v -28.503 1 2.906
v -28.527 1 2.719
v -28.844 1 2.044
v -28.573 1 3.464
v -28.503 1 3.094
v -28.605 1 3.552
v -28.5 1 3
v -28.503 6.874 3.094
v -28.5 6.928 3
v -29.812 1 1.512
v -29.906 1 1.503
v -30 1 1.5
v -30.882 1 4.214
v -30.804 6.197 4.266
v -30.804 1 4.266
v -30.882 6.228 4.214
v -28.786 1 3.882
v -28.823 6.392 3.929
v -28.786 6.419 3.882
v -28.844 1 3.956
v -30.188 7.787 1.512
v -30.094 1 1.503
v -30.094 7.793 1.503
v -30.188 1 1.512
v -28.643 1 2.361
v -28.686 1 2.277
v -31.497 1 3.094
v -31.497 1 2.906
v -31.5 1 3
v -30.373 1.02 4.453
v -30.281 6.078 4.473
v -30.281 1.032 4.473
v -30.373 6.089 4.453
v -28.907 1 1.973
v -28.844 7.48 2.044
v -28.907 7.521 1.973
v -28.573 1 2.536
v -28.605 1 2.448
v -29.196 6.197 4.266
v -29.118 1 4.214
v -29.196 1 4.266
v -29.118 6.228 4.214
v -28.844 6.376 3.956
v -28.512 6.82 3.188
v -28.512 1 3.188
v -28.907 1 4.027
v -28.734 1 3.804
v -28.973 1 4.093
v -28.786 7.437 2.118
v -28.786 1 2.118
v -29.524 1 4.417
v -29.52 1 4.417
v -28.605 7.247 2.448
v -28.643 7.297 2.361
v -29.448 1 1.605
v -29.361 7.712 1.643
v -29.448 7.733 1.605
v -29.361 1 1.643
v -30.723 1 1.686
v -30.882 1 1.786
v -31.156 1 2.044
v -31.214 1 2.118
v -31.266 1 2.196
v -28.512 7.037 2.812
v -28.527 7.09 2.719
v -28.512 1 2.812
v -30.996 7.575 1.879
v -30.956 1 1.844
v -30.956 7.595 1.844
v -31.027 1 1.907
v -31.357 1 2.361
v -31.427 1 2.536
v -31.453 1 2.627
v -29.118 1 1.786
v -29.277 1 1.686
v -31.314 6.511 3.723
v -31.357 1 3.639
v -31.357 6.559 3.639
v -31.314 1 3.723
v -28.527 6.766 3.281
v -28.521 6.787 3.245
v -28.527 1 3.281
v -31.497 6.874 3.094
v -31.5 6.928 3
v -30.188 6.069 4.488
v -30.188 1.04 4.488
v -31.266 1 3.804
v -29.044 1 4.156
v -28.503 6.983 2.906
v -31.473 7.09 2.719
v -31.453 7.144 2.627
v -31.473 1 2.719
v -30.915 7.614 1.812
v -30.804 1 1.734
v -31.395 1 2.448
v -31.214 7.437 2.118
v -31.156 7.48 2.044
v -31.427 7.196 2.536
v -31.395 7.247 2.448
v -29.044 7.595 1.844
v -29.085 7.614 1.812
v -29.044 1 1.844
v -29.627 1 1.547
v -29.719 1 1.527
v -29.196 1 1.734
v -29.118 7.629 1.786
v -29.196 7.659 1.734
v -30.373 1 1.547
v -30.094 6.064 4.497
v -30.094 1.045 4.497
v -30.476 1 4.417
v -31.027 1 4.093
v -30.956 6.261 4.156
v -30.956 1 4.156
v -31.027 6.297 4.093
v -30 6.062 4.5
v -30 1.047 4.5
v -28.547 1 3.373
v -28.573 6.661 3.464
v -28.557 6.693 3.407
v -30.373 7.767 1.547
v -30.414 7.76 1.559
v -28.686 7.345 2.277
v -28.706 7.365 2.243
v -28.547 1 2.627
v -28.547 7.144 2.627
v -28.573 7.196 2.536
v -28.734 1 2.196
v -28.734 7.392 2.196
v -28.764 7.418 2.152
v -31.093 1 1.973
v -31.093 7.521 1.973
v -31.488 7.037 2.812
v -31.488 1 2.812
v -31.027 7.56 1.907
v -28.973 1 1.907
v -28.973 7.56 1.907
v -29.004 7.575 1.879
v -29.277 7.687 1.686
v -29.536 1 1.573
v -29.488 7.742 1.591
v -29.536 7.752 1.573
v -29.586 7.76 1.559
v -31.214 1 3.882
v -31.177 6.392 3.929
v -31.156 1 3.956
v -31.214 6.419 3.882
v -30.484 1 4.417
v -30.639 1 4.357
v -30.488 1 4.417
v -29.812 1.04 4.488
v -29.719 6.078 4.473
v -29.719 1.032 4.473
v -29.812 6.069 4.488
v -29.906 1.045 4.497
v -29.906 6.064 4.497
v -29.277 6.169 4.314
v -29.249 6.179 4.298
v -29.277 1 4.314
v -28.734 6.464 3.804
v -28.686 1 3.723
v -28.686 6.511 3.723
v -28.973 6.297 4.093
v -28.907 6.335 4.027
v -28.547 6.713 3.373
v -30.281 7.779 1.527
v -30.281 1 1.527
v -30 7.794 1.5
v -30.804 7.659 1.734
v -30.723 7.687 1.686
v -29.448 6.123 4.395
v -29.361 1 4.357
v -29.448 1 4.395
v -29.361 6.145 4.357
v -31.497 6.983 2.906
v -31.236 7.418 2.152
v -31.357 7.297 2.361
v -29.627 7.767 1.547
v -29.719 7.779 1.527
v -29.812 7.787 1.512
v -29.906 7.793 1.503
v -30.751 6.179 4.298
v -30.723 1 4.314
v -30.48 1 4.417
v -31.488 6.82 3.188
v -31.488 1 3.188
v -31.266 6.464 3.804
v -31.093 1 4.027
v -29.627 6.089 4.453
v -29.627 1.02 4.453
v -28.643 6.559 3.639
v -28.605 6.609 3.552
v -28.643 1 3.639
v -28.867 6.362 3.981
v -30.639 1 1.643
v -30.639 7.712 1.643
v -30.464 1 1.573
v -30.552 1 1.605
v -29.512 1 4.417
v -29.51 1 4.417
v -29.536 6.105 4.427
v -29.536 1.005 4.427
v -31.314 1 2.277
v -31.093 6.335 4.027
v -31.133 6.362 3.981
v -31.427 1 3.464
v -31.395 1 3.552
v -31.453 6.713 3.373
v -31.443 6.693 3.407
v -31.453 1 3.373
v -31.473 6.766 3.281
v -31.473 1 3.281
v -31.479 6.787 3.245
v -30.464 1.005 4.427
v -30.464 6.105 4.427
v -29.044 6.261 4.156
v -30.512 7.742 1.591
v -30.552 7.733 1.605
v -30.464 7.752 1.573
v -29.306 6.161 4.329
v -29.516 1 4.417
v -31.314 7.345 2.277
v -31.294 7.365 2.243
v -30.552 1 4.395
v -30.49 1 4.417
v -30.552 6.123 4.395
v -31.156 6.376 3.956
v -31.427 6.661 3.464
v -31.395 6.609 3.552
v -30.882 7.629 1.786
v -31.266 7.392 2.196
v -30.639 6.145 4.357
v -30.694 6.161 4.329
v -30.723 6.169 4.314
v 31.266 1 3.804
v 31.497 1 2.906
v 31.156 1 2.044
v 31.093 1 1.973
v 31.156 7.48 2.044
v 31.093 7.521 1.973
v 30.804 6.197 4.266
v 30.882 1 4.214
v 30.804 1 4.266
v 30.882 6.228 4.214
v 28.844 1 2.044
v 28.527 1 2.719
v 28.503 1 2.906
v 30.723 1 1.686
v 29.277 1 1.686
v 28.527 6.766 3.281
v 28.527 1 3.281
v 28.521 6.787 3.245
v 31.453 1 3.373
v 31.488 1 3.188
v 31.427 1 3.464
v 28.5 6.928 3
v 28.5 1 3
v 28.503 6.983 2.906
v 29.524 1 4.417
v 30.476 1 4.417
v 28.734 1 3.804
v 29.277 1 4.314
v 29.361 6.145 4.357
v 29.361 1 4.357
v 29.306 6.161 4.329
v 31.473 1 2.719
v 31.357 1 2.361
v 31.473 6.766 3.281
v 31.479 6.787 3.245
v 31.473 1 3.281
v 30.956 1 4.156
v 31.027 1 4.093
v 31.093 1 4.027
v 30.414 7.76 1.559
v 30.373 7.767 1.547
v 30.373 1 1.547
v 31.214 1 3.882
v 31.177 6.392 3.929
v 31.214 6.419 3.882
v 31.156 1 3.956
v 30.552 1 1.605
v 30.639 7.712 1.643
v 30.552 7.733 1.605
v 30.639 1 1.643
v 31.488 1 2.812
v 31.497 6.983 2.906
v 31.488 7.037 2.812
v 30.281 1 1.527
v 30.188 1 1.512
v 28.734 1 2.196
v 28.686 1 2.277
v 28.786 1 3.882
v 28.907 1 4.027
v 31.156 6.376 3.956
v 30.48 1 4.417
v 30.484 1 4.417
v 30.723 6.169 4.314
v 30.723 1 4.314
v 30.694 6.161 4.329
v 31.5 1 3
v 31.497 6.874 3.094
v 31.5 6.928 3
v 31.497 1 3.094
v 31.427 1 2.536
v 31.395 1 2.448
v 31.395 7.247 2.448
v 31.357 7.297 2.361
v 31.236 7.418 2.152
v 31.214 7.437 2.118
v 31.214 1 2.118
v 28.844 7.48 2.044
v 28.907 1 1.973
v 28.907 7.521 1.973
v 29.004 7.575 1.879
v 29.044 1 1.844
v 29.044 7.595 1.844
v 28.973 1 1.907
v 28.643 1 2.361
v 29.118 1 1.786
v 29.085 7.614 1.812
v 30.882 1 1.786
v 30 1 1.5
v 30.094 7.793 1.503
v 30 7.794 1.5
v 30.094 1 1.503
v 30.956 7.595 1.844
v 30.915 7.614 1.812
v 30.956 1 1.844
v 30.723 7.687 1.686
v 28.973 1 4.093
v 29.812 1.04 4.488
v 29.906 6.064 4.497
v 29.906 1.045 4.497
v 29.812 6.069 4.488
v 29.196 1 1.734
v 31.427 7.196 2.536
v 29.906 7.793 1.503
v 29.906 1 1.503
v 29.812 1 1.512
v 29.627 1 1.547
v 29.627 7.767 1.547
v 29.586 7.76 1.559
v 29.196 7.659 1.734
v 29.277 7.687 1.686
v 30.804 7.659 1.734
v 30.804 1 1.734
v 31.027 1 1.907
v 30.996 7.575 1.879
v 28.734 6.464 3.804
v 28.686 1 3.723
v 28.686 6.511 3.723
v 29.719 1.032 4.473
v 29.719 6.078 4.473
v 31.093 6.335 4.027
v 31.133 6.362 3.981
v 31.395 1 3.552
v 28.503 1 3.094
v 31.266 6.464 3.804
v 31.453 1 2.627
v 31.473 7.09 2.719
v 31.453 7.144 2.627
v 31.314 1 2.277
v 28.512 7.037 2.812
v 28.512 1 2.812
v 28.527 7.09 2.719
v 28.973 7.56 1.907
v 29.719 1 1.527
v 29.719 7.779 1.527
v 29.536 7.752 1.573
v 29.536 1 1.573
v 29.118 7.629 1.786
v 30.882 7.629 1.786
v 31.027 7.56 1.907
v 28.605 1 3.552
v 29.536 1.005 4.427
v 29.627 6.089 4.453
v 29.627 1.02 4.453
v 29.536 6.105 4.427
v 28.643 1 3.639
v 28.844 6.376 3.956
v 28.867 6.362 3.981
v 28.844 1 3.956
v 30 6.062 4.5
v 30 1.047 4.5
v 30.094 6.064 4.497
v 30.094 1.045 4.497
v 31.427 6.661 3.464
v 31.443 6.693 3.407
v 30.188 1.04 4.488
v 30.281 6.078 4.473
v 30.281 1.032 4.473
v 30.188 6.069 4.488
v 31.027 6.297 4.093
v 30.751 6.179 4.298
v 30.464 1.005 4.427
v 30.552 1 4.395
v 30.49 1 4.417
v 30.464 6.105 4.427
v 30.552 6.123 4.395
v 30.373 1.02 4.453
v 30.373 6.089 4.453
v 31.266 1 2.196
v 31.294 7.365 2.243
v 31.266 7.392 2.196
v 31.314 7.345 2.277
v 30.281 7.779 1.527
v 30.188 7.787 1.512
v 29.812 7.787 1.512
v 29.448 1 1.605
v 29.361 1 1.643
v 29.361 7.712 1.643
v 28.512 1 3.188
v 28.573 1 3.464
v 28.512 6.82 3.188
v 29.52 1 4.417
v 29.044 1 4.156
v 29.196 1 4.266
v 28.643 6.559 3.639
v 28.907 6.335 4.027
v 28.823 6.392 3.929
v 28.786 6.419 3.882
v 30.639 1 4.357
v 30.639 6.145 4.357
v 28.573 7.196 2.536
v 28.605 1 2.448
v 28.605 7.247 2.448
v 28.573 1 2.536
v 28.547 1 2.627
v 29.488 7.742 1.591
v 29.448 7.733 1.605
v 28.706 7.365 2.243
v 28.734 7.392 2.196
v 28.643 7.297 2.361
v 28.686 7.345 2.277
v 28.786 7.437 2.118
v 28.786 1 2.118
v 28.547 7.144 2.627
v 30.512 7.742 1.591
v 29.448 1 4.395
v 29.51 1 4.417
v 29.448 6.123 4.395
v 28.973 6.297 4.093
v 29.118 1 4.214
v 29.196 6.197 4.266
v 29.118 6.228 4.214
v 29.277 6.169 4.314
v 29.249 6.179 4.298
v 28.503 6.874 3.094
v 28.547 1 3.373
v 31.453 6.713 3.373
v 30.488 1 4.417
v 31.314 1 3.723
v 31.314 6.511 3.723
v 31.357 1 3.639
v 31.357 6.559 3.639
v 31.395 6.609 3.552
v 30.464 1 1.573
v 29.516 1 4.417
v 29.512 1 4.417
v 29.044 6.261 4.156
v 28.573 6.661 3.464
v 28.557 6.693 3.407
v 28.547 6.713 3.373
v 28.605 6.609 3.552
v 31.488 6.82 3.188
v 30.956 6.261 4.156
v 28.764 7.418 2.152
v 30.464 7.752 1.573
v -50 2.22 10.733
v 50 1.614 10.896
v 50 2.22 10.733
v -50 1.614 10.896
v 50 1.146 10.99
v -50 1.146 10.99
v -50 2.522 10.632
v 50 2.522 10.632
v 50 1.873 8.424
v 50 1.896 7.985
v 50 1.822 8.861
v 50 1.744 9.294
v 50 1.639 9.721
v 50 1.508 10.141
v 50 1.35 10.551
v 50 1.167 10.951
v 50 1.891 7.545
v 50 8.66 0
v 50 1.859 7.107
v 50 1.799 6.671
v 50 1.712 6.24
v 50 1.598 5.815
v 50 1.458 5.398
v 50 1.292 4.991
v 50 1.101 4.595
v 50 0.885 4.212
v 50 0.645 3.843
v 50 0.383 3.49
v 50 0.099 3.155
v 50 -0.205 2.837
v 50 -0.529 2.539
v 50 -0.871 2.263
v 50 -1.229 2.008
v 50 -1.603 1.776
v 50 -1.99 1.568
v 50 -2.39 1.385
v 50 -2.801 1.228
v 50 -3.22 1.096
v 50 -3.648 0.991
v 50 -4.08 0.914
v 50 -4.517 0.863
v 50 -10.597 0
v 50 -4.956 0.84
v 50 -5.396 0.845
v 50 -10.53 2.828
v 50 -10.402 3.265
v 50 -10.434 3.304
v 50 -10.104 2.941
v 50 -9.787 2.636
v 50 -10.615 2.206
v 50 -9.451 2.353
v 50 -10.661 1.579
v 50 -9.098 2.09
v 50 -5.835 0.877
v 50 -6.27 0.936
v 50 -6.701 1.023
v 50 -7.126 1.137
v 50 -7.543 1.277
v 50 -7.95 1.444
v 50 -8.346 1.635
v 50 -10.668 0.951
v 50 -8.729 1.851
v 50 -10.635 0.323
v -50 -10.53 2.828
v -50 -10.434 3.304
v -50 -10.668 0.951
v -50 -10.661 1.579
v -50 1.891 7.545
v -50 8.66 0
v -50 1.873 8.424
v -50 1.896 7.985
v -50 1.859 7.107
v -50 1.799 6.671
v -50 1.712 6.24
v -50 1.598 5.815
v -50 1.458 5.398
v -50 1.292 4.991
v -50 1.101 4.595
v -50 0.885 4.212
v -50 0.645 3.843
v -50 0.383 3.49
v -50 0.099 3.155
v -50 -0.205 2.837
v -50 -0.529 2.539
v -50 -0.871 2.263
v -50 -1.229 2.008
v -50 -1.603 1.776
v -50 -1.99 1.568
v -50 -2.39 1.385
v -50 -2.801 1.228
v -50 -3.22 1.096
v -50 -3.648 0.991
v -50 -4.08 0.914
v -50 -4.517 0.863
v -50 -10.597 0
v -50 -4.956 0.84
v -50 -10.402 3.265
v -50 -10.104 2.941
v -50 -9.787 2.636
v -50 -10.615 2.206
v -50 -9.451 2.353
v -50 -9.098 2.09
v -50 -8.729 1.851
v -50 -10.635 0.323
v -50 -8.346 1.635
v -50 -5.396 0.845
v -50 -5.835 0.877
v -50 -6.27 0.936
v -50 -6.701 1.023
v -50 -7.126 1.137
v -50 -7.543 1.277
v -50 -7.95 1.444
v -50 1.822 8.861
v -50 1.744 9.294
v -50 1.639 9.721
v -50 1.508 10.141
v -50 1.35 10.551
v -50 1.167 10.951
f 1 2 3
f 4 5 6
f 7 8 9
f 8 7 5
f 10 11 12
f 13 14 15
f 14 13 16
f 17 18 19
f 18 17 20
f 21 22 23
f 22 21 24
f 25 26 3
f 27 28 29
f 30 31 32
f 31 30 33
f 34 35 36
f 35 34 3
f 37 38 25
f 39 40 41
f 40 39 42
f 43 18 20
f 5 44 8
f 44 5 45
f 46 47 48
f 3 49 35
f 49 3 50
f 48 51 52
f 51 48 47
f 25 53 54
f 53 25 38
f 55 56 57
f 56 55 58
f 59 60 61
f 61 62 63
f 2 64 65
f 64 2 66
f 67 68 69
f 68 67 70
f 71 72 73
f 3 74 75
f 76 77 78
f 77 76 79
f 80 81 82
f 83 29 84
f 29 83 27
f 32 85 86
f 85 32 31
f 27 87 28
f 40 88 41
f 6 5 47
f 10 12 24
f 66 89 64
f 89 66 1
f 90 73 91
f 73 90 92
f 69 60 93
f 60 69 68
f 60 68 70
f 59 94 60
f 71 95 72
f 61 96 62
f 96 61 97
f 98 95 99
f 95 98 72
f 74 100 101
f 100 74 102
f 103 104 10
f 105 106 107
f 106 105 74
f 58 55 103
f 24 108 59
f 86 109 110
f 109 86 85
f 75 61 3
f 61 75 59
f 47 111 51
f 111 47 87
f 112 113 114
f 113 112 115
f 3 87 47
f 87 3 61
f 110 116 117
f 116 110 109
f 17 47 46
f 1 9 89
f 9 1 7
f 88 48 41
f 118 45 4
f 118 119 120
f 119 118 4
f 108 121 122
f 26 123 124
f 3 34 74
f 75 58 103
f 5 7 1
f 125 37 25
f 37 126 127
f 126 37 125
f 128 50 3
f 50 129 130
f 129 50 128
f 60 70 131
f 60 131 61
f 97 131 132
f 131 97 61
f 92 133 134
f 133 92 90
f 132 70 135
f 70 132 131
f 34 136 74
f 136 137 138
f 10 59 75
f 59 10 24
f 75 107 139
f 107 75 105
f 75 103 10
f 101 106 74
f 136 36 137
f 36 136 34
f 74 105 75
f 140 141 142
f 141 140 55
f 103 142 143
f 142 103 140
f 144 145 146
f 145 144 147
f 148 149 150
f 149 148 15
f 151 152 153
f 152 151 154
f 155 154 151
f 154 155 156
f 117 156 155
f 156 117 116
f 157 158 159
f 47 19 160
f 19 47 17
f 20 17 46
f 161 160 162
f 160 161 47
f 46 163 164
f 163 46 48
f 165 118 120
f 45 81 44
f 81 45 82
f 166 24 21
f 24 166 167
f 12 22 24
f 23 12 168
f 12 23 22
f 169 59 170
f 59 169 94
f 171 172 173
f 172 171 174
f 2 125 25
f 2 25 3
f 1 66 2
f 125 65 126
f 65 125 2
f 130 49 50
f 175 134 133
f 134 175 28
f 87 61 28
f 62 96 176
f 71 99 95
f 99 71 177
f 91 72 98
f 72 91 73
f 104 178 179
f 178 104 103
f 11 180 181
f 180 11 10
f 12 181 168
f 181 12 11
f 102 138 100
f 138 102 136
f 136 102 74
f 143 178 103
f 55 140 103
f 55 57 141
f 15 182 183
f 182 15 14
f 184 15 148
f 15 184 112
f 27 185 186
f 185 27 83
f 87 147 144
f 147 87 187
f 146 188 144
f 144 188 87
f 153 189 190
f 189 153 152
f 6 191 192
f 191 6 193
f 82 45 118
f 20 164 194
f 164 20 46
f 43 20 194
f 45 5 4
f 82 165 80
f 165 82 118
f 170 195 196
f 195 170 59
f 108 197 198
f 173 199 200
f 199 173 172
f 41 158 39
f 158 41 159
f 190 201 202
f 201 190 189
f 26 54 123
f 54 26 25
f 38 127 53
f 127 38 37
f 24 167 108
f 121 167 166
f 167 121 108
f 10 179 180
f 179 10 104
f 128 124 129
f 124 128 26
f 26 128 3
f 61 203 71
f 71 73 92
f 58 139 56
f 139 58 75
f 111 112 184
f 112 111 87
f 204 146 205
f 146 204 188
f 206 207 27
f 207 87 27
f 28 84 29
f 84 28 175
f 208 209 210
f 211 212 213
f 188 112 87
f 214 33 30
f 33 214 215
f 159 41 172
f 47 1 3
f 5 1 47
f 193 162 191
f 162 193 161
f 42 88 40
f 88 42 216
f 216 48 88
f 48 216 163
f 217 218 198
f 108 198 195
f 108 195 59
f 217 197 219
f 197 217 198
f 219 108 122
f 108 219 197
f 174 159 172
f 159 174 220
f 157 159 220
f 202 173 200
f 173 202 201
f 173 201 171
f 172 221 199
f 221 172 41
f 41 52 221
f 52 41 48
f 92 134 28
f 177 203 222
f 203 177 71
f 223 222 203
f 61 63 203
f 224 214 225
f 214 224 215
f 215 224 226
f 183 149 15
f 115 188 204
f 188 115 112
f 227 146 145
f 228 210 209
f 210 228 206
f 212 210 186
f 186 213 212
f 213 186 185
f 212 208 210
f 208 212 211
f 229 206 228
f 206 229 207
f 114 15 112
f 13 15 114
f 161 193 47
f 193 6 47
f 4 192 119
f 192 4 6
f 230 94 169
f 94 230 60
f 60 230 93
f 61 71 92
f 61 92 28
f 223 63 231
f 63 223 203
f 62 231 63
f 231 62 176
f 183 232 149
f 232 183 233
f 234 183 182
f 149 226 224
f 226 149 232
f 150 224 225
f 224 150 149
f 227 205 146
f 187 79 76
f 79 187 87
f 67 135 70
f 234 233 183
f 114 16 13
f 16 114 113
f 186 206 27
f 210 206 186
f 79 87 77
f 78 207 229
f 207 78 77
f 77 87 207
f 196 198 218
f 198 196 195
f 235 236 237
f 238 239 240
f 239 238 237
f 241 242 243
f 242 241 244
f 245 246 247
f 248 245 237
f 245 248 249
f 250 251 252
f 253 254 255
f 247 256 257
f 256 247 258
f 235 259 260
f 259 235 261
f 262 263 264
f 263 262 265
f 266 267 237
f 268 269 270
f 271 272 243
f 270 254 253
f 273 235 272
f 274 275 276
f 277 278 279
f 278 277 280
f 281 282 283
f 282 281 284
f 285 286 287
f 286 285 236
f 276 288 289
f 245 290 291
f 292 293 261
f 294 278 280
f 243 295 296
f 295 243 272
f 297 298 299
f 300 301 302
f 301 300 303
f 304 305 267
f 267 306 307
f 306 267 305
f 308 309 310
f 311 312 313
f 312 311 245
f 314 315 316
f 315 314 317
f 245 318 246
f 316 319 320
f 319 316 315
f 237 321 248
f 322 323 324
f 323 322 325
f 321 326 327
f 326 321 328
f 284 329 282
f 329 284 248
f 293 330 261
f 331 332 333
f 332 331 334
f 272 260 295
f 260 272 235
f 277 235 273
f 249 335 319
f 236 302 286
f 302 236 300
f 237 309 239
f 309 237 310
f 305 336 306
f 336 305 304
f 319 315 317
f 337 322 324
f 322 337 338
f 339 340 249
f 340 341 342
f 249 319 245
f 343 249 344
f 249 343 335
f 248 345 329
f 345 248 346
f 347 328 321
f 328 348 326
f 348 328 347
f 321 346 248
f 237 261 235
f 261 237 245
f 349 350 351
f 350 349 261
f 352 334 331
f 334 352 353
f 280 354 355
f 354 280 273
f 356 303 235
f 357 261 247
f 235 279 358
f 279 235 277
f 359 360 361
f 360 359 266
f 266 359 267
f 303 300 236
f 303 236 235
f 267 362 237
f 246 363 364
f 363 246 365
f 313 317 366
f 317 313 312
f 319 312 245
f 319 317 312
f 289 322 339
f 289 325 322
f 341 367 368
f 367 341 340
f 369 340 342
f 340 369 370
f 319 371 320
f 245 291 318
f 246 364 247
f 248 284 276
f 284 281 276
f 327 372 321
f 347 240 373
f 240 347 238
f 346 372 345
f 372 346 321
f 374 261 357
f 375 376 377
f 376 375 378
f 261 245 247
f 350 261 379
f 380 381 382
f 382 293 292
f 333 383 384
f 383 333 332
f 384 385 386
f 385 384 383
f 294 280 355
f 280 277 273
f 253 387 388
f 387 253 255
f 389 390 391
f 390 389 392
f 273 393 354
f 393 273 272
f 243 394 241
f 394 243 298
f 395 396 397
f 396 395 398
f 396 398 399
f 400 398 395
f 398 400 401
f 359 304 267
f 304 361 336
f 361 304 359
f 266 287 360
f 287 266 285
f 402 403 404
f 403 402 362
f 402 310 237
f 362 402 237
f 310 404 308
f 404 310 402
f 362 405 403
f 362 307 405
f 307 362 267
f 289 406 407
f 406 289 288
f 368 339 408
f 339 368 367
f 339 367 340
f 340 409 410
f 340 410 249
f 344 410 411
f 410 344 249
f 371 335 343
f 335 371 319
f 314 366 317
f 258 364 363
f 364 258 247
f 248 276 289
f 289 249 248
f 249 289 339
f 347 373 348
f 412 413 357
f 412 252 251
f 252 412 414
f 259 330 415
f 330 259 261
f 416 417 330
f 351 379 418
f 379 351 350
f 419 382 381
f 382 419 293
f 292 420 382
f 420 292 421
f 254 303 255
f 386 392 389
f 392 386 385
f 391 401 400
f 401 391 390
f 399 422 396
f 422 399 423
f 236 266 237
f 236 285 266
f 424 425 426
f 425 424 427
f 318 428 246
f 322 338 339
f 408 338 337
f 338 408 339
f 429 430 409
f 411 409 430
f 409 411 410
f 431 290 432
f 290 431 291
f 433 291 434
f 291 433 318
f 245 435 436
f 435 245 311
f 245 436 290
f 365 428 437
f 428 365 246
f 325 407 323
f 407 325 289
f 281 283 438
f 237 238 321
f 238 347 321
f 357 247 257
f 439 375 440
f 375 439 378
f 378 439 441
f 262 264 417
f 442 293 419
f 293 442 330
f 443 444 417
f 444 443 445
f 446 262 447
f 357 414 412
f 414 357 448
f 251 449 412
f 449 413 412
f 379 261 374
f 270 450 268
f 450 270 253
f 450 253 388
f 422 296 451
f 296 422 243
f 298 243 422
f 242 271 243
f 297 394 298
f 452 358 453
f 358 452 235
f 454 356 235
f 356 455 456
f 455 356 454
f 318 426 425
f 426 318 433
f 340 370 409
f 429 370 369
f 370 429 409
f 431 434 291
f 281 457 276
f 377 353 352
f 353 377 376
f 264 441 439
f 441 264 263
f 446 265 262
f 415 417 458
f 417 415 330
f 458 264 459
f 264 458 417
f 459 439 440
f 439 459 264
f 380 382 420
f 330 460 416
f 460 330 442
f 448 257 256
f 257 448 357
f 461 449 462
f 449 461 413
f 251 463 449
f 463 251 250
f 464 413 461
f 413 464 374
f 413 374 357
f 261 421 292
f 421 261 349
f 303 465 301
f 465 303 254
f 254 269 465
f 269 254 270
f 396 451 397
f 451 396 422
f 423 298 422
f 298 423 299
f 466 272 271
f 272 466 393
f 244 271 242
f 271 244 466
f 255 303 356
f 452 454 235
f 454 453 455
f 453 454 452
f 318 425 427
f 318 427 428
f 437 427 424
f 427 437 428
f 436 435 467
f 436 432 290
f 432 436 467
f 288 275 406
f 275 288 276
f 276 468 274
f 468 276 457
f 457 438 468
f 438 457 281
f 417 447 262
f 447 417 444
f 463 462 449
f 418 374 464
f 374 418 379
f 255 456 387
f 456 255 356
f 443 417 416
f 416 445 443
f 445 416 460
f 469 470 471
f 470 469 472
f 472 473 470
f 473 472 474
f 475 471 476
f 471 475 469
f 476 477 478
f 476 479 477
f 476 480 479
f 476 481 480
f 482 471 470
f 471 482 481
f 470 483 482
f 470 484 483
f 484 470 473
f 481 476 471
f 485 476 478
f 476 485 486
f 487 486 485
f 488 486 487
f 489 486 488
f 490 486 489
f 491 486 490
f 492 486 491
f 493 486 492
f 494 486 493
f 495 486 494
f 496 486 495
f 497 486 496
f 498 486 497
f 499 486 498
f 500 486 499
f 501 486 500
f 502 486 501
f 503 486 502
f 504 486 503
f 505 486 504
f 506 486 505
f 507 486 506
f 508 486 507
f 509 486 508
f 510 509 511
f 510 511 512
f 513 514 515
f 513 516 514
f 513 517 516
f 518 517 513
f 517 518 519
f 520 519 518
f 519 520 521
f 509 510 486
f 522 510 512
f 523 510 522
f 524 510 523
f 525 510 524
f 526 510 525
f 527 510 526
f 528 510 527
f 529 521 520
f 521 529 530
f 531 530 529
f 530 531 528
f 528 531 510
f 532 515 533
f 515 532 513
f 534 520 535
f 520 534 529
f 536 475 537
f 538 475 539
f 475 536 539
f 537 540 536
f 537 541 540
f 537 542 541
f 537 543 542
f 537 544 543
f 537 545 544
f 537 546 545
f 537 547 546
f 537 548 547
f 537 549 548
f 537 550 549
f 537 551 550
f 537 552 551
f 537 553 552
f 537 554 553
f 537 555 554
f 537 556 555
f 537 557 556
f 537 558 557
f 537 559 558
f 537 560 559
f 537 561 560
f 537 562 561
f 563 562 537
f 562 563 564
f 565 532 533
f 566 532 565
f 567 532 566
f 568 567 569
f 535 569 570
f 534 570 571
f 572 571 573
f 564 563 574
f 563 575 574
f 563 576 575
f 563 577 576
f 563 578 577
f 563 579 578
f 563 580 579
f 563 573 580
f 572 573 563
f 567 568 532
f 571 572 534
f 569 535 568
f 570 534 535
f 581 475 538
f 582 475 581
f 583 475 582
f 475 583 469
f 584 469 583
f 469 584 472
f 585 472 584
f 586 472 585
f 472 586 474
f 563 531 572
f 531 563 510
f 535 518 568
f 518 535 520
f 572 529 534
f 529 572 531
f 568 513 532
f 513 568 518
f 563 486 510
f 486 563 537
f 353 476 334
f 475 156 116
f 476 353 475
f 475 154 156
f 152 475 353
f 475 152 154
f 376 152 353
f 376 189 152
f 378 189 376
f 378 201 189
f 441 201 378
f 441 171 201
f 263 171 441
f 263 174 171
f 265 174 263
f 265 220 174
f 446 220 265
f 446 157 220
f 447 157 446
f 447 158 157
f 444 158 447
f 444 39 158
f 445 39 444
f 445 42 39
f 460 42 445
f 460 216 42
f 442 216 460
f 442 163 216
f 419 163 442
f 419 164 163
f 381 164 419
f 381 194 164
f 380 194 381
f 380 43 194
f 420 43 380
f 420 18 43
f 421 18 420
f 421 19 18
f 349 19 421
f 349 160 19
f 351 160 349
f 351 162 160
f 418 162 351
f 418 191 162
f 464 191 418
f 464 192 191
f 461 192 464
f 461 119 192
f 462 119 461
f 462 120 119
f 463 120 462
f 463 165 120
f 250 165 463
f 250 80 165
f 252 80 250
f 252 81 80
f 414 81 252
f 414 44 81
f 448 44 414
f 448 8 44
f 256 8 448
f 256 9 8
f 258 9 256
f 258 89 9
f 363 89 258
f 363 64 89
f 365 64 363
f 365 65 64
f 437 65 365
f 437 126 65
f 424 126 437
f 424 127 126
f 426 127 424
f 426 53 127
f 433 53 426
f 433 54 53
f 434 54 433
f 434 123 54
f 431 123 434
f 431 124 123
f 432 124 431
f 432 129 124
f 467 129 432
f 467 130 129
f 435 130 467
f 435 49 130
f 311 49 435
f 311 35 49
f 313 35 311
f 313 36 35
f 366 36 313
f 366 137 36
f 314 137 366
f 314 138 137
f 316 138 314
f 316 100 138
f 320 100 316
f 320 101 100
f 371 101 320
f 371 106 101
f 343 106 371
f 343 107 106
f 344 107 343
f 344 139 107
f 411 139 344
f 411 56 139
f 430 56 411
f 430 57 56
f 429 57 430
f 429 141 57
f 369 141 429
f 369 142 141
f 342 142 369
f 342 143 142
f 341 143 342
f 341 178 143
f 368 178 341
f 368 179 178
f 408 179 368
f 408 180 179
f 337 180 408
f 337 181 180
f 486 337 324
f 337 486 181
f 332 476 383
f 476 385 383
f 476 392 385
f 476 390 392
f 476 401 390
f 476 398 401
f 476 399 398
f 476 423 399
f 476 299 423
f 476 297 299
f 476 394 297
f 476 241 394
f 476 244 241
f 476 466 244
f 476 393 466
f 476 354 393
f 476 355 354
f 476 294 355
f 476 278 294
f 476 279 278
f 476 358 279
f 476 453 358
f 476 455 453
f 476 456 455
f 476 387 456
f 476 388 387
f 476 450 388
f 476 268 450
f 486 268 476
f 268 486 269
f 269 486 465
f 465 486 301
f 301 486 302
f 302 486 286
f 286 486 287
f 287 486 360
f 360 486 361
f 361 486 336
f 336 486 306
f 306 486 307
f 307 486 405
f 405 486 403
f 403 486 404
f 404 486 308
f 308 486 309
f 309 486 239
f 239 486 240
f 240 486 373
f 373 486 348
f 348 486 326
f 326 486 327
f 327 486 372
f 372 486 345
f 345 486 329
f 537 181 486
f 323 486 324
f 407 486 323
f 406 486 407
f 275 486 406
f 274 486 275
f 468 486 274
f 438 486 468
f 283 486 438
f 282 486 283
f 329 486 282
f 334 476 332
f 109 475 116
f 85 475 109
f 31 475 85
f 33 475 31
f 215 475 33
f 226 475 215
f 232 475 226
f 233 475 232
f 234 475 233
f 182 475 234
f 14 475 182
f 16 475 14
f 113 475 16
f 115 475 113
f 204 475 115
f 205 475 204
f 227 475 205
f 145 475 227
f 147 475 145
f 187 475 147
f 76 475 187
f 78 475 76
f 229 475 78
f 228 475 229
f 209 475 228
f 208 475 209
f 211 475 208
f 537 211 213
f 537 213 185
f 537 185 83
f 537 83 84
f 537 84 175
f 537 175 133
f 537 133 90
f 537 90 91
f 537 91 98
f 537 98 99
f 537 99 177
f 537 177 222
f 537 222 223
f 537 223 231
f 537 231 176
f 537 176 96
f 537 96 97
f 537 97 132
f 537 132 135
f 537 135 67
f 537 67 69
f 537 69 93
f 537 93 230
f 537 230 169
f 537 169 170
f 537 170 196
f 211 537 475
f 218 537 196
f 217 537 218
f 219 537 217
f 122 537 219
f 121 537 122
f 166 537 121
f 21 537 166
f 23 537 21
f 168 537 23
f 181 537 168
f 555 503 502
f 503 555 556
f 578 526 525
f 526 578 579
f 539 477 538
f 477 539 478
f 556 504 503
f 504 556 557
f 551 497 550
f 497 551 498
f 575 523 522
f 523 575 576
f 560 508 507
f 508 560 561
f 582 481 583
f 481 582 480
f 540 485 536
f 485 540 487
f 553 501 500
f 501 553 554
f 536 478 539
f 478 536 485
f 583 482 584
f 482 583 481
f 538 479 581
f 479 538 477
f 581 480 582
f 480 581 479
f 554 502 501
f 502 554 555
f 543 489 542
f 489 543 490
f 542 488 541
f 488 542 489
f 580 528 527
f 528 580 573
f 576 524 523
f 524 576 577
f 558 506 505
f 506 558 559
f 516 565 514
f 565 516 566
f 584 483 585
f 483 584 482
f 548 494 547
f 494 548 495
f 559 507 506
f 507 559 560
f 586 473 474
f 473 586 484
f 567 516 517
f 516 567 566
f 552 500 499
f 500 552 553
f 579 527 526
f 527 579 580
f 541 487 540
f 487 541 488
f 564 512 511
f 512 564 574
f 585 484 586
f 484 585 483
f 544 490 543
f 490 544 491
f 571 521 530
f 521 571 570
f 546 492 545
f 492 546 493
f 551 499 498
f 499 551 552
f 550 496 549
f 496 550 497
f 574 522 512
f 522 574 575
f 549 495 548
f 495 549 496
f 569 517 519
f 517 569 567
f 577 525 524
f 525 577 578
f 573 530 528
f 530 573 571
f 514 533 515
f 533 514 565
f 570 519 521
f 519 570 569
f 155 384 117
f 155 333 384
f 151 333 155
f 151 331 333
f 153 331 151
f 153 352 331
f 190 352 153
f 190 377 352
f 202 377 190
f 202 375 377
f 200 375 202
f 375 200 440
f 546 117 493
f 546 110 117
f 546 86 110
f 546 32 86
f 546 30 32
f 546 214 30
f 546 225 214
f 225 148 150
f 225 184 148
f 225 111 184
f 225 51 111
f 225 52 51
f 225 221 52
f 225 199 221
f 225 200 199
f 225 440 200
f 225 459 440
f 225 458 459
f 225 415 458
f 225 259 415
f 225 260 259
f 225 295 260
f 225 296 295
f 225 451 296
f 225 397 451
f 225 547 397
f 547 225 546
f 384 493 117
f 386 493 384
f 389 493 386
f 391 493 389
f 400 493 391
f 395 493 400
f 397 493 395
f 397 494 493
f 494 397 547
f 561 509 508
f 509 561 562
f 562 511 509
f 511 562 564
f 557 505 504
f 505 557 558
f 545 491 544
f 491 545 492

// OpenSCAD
// [FL_INDEX: keywords="openscad, 3d_parametric, Customizable_Marble_Run, csg_solid" | COT="Parametric OpenSCAD design from 3DCodeverse"]
// Title: Customizable Marble Run

//http://www.thingiverse.com/thing:56236
//by mattjoyce
//customized by Arvin Evans

//length of trough
l1=100;
//magnet radius given as diameter measure. ( /2 in code)
mr=6.25;
//magnet hole depth
md=2;
//outside diameter of cylinder to subtract from and give nice round edges
od=10;
//My additions to mattjoyce's code
withMagnets="no";//[yes:Magnets,no:Pins,other:both]

pinDia=3;//filament pins to attach to a non-magnetic back plate
pinHoleDepth=5;
pinLength=15;

//Pins at the same angle as the back or horizontal to build platform?
perpendicular="false";//[true:90 degrees to back,false:parallel to bottom]
backAngle=60;
placeOnBuildPlatform="true";//[true:Flat to build platform,false:As the Original]

$fn=100;

module track(){
	difference(){
		rotate([0,90,0]) translate([-od,od/2,0]) 
		cylinder(r=od,h=l1);// gives nice round edges
		rotate([backAngle,0,0]) translate([-1,-od,-od]) 
		cube([l1+2,od*2,od*3]);// flattens the bottom
		translate([-1,od+2.5,0]) 
		cube([l1+2,od*2,od*3]);// flattens the back
		rotate([0,90,0]) translate([-18,4.5,-1]) 
		cylinder(r=7,h=l1+2); // the marble trough
	
		if(withMagnets=="yes" || withMagnets=="other"){
			rotate([90,0,0]) translate([l1/5,mr*2,-15+md])// 1/5
			cylinder(r=mr/2,h=md);// (back) magnet hole1
			rotate([90,0,0]) translate([l1/5*2.5,mr*1.5,-15+md])// 2.5/5=1/2 
			cylinder(r=mr/2,h=md);// (middle) magnet hole2
			rotate([90,0,0]) translate([l1/5*4,mr*2,-15+md])// 4/5 
			cylinder(r=mr/2,h=md);// (front) magnet hole3
		}
		if(withMagnets=="no" || withMagnets=="other"){
			if(perpendicular=="true"){// 90 degrees
				rotate([90,0,0]) 
				translate([l1/5,od,-pinLength-pinHoleDepth-1])
#				cylinder(r=pinDia/2,h=pinLength);
			
				rotate([90,0,0]) 
				translate([l1/5*4,od,-pinLength-pinHoleDepth-1]) 
#				cylinder(r=pinDia/2,h=pinLength);

			}else{//angled at backAngle degrees
				rotate([backAngle,0,0]) 
				translate([l1/5,od+pinDia,-pinLength-1])
#				cylinder(r=pinDia/2,h=pinLength);
			
				rotate([backAngle,0,0]) 
				translate([l1/5*4,od+pinDia,-pinLength-1]) 
#				cylinder(r=pinDia/2,h=pinLength);
			}
		}
	}
}

module main(){
  if(placeOnBuildPlatform=="true"){
	translate([-l1/2,0,-od])// move down to platform
	rotate([90-backAngle,0,0])// put the base flat to platform
	track();
  } else {
	track();
  }
}

main();
